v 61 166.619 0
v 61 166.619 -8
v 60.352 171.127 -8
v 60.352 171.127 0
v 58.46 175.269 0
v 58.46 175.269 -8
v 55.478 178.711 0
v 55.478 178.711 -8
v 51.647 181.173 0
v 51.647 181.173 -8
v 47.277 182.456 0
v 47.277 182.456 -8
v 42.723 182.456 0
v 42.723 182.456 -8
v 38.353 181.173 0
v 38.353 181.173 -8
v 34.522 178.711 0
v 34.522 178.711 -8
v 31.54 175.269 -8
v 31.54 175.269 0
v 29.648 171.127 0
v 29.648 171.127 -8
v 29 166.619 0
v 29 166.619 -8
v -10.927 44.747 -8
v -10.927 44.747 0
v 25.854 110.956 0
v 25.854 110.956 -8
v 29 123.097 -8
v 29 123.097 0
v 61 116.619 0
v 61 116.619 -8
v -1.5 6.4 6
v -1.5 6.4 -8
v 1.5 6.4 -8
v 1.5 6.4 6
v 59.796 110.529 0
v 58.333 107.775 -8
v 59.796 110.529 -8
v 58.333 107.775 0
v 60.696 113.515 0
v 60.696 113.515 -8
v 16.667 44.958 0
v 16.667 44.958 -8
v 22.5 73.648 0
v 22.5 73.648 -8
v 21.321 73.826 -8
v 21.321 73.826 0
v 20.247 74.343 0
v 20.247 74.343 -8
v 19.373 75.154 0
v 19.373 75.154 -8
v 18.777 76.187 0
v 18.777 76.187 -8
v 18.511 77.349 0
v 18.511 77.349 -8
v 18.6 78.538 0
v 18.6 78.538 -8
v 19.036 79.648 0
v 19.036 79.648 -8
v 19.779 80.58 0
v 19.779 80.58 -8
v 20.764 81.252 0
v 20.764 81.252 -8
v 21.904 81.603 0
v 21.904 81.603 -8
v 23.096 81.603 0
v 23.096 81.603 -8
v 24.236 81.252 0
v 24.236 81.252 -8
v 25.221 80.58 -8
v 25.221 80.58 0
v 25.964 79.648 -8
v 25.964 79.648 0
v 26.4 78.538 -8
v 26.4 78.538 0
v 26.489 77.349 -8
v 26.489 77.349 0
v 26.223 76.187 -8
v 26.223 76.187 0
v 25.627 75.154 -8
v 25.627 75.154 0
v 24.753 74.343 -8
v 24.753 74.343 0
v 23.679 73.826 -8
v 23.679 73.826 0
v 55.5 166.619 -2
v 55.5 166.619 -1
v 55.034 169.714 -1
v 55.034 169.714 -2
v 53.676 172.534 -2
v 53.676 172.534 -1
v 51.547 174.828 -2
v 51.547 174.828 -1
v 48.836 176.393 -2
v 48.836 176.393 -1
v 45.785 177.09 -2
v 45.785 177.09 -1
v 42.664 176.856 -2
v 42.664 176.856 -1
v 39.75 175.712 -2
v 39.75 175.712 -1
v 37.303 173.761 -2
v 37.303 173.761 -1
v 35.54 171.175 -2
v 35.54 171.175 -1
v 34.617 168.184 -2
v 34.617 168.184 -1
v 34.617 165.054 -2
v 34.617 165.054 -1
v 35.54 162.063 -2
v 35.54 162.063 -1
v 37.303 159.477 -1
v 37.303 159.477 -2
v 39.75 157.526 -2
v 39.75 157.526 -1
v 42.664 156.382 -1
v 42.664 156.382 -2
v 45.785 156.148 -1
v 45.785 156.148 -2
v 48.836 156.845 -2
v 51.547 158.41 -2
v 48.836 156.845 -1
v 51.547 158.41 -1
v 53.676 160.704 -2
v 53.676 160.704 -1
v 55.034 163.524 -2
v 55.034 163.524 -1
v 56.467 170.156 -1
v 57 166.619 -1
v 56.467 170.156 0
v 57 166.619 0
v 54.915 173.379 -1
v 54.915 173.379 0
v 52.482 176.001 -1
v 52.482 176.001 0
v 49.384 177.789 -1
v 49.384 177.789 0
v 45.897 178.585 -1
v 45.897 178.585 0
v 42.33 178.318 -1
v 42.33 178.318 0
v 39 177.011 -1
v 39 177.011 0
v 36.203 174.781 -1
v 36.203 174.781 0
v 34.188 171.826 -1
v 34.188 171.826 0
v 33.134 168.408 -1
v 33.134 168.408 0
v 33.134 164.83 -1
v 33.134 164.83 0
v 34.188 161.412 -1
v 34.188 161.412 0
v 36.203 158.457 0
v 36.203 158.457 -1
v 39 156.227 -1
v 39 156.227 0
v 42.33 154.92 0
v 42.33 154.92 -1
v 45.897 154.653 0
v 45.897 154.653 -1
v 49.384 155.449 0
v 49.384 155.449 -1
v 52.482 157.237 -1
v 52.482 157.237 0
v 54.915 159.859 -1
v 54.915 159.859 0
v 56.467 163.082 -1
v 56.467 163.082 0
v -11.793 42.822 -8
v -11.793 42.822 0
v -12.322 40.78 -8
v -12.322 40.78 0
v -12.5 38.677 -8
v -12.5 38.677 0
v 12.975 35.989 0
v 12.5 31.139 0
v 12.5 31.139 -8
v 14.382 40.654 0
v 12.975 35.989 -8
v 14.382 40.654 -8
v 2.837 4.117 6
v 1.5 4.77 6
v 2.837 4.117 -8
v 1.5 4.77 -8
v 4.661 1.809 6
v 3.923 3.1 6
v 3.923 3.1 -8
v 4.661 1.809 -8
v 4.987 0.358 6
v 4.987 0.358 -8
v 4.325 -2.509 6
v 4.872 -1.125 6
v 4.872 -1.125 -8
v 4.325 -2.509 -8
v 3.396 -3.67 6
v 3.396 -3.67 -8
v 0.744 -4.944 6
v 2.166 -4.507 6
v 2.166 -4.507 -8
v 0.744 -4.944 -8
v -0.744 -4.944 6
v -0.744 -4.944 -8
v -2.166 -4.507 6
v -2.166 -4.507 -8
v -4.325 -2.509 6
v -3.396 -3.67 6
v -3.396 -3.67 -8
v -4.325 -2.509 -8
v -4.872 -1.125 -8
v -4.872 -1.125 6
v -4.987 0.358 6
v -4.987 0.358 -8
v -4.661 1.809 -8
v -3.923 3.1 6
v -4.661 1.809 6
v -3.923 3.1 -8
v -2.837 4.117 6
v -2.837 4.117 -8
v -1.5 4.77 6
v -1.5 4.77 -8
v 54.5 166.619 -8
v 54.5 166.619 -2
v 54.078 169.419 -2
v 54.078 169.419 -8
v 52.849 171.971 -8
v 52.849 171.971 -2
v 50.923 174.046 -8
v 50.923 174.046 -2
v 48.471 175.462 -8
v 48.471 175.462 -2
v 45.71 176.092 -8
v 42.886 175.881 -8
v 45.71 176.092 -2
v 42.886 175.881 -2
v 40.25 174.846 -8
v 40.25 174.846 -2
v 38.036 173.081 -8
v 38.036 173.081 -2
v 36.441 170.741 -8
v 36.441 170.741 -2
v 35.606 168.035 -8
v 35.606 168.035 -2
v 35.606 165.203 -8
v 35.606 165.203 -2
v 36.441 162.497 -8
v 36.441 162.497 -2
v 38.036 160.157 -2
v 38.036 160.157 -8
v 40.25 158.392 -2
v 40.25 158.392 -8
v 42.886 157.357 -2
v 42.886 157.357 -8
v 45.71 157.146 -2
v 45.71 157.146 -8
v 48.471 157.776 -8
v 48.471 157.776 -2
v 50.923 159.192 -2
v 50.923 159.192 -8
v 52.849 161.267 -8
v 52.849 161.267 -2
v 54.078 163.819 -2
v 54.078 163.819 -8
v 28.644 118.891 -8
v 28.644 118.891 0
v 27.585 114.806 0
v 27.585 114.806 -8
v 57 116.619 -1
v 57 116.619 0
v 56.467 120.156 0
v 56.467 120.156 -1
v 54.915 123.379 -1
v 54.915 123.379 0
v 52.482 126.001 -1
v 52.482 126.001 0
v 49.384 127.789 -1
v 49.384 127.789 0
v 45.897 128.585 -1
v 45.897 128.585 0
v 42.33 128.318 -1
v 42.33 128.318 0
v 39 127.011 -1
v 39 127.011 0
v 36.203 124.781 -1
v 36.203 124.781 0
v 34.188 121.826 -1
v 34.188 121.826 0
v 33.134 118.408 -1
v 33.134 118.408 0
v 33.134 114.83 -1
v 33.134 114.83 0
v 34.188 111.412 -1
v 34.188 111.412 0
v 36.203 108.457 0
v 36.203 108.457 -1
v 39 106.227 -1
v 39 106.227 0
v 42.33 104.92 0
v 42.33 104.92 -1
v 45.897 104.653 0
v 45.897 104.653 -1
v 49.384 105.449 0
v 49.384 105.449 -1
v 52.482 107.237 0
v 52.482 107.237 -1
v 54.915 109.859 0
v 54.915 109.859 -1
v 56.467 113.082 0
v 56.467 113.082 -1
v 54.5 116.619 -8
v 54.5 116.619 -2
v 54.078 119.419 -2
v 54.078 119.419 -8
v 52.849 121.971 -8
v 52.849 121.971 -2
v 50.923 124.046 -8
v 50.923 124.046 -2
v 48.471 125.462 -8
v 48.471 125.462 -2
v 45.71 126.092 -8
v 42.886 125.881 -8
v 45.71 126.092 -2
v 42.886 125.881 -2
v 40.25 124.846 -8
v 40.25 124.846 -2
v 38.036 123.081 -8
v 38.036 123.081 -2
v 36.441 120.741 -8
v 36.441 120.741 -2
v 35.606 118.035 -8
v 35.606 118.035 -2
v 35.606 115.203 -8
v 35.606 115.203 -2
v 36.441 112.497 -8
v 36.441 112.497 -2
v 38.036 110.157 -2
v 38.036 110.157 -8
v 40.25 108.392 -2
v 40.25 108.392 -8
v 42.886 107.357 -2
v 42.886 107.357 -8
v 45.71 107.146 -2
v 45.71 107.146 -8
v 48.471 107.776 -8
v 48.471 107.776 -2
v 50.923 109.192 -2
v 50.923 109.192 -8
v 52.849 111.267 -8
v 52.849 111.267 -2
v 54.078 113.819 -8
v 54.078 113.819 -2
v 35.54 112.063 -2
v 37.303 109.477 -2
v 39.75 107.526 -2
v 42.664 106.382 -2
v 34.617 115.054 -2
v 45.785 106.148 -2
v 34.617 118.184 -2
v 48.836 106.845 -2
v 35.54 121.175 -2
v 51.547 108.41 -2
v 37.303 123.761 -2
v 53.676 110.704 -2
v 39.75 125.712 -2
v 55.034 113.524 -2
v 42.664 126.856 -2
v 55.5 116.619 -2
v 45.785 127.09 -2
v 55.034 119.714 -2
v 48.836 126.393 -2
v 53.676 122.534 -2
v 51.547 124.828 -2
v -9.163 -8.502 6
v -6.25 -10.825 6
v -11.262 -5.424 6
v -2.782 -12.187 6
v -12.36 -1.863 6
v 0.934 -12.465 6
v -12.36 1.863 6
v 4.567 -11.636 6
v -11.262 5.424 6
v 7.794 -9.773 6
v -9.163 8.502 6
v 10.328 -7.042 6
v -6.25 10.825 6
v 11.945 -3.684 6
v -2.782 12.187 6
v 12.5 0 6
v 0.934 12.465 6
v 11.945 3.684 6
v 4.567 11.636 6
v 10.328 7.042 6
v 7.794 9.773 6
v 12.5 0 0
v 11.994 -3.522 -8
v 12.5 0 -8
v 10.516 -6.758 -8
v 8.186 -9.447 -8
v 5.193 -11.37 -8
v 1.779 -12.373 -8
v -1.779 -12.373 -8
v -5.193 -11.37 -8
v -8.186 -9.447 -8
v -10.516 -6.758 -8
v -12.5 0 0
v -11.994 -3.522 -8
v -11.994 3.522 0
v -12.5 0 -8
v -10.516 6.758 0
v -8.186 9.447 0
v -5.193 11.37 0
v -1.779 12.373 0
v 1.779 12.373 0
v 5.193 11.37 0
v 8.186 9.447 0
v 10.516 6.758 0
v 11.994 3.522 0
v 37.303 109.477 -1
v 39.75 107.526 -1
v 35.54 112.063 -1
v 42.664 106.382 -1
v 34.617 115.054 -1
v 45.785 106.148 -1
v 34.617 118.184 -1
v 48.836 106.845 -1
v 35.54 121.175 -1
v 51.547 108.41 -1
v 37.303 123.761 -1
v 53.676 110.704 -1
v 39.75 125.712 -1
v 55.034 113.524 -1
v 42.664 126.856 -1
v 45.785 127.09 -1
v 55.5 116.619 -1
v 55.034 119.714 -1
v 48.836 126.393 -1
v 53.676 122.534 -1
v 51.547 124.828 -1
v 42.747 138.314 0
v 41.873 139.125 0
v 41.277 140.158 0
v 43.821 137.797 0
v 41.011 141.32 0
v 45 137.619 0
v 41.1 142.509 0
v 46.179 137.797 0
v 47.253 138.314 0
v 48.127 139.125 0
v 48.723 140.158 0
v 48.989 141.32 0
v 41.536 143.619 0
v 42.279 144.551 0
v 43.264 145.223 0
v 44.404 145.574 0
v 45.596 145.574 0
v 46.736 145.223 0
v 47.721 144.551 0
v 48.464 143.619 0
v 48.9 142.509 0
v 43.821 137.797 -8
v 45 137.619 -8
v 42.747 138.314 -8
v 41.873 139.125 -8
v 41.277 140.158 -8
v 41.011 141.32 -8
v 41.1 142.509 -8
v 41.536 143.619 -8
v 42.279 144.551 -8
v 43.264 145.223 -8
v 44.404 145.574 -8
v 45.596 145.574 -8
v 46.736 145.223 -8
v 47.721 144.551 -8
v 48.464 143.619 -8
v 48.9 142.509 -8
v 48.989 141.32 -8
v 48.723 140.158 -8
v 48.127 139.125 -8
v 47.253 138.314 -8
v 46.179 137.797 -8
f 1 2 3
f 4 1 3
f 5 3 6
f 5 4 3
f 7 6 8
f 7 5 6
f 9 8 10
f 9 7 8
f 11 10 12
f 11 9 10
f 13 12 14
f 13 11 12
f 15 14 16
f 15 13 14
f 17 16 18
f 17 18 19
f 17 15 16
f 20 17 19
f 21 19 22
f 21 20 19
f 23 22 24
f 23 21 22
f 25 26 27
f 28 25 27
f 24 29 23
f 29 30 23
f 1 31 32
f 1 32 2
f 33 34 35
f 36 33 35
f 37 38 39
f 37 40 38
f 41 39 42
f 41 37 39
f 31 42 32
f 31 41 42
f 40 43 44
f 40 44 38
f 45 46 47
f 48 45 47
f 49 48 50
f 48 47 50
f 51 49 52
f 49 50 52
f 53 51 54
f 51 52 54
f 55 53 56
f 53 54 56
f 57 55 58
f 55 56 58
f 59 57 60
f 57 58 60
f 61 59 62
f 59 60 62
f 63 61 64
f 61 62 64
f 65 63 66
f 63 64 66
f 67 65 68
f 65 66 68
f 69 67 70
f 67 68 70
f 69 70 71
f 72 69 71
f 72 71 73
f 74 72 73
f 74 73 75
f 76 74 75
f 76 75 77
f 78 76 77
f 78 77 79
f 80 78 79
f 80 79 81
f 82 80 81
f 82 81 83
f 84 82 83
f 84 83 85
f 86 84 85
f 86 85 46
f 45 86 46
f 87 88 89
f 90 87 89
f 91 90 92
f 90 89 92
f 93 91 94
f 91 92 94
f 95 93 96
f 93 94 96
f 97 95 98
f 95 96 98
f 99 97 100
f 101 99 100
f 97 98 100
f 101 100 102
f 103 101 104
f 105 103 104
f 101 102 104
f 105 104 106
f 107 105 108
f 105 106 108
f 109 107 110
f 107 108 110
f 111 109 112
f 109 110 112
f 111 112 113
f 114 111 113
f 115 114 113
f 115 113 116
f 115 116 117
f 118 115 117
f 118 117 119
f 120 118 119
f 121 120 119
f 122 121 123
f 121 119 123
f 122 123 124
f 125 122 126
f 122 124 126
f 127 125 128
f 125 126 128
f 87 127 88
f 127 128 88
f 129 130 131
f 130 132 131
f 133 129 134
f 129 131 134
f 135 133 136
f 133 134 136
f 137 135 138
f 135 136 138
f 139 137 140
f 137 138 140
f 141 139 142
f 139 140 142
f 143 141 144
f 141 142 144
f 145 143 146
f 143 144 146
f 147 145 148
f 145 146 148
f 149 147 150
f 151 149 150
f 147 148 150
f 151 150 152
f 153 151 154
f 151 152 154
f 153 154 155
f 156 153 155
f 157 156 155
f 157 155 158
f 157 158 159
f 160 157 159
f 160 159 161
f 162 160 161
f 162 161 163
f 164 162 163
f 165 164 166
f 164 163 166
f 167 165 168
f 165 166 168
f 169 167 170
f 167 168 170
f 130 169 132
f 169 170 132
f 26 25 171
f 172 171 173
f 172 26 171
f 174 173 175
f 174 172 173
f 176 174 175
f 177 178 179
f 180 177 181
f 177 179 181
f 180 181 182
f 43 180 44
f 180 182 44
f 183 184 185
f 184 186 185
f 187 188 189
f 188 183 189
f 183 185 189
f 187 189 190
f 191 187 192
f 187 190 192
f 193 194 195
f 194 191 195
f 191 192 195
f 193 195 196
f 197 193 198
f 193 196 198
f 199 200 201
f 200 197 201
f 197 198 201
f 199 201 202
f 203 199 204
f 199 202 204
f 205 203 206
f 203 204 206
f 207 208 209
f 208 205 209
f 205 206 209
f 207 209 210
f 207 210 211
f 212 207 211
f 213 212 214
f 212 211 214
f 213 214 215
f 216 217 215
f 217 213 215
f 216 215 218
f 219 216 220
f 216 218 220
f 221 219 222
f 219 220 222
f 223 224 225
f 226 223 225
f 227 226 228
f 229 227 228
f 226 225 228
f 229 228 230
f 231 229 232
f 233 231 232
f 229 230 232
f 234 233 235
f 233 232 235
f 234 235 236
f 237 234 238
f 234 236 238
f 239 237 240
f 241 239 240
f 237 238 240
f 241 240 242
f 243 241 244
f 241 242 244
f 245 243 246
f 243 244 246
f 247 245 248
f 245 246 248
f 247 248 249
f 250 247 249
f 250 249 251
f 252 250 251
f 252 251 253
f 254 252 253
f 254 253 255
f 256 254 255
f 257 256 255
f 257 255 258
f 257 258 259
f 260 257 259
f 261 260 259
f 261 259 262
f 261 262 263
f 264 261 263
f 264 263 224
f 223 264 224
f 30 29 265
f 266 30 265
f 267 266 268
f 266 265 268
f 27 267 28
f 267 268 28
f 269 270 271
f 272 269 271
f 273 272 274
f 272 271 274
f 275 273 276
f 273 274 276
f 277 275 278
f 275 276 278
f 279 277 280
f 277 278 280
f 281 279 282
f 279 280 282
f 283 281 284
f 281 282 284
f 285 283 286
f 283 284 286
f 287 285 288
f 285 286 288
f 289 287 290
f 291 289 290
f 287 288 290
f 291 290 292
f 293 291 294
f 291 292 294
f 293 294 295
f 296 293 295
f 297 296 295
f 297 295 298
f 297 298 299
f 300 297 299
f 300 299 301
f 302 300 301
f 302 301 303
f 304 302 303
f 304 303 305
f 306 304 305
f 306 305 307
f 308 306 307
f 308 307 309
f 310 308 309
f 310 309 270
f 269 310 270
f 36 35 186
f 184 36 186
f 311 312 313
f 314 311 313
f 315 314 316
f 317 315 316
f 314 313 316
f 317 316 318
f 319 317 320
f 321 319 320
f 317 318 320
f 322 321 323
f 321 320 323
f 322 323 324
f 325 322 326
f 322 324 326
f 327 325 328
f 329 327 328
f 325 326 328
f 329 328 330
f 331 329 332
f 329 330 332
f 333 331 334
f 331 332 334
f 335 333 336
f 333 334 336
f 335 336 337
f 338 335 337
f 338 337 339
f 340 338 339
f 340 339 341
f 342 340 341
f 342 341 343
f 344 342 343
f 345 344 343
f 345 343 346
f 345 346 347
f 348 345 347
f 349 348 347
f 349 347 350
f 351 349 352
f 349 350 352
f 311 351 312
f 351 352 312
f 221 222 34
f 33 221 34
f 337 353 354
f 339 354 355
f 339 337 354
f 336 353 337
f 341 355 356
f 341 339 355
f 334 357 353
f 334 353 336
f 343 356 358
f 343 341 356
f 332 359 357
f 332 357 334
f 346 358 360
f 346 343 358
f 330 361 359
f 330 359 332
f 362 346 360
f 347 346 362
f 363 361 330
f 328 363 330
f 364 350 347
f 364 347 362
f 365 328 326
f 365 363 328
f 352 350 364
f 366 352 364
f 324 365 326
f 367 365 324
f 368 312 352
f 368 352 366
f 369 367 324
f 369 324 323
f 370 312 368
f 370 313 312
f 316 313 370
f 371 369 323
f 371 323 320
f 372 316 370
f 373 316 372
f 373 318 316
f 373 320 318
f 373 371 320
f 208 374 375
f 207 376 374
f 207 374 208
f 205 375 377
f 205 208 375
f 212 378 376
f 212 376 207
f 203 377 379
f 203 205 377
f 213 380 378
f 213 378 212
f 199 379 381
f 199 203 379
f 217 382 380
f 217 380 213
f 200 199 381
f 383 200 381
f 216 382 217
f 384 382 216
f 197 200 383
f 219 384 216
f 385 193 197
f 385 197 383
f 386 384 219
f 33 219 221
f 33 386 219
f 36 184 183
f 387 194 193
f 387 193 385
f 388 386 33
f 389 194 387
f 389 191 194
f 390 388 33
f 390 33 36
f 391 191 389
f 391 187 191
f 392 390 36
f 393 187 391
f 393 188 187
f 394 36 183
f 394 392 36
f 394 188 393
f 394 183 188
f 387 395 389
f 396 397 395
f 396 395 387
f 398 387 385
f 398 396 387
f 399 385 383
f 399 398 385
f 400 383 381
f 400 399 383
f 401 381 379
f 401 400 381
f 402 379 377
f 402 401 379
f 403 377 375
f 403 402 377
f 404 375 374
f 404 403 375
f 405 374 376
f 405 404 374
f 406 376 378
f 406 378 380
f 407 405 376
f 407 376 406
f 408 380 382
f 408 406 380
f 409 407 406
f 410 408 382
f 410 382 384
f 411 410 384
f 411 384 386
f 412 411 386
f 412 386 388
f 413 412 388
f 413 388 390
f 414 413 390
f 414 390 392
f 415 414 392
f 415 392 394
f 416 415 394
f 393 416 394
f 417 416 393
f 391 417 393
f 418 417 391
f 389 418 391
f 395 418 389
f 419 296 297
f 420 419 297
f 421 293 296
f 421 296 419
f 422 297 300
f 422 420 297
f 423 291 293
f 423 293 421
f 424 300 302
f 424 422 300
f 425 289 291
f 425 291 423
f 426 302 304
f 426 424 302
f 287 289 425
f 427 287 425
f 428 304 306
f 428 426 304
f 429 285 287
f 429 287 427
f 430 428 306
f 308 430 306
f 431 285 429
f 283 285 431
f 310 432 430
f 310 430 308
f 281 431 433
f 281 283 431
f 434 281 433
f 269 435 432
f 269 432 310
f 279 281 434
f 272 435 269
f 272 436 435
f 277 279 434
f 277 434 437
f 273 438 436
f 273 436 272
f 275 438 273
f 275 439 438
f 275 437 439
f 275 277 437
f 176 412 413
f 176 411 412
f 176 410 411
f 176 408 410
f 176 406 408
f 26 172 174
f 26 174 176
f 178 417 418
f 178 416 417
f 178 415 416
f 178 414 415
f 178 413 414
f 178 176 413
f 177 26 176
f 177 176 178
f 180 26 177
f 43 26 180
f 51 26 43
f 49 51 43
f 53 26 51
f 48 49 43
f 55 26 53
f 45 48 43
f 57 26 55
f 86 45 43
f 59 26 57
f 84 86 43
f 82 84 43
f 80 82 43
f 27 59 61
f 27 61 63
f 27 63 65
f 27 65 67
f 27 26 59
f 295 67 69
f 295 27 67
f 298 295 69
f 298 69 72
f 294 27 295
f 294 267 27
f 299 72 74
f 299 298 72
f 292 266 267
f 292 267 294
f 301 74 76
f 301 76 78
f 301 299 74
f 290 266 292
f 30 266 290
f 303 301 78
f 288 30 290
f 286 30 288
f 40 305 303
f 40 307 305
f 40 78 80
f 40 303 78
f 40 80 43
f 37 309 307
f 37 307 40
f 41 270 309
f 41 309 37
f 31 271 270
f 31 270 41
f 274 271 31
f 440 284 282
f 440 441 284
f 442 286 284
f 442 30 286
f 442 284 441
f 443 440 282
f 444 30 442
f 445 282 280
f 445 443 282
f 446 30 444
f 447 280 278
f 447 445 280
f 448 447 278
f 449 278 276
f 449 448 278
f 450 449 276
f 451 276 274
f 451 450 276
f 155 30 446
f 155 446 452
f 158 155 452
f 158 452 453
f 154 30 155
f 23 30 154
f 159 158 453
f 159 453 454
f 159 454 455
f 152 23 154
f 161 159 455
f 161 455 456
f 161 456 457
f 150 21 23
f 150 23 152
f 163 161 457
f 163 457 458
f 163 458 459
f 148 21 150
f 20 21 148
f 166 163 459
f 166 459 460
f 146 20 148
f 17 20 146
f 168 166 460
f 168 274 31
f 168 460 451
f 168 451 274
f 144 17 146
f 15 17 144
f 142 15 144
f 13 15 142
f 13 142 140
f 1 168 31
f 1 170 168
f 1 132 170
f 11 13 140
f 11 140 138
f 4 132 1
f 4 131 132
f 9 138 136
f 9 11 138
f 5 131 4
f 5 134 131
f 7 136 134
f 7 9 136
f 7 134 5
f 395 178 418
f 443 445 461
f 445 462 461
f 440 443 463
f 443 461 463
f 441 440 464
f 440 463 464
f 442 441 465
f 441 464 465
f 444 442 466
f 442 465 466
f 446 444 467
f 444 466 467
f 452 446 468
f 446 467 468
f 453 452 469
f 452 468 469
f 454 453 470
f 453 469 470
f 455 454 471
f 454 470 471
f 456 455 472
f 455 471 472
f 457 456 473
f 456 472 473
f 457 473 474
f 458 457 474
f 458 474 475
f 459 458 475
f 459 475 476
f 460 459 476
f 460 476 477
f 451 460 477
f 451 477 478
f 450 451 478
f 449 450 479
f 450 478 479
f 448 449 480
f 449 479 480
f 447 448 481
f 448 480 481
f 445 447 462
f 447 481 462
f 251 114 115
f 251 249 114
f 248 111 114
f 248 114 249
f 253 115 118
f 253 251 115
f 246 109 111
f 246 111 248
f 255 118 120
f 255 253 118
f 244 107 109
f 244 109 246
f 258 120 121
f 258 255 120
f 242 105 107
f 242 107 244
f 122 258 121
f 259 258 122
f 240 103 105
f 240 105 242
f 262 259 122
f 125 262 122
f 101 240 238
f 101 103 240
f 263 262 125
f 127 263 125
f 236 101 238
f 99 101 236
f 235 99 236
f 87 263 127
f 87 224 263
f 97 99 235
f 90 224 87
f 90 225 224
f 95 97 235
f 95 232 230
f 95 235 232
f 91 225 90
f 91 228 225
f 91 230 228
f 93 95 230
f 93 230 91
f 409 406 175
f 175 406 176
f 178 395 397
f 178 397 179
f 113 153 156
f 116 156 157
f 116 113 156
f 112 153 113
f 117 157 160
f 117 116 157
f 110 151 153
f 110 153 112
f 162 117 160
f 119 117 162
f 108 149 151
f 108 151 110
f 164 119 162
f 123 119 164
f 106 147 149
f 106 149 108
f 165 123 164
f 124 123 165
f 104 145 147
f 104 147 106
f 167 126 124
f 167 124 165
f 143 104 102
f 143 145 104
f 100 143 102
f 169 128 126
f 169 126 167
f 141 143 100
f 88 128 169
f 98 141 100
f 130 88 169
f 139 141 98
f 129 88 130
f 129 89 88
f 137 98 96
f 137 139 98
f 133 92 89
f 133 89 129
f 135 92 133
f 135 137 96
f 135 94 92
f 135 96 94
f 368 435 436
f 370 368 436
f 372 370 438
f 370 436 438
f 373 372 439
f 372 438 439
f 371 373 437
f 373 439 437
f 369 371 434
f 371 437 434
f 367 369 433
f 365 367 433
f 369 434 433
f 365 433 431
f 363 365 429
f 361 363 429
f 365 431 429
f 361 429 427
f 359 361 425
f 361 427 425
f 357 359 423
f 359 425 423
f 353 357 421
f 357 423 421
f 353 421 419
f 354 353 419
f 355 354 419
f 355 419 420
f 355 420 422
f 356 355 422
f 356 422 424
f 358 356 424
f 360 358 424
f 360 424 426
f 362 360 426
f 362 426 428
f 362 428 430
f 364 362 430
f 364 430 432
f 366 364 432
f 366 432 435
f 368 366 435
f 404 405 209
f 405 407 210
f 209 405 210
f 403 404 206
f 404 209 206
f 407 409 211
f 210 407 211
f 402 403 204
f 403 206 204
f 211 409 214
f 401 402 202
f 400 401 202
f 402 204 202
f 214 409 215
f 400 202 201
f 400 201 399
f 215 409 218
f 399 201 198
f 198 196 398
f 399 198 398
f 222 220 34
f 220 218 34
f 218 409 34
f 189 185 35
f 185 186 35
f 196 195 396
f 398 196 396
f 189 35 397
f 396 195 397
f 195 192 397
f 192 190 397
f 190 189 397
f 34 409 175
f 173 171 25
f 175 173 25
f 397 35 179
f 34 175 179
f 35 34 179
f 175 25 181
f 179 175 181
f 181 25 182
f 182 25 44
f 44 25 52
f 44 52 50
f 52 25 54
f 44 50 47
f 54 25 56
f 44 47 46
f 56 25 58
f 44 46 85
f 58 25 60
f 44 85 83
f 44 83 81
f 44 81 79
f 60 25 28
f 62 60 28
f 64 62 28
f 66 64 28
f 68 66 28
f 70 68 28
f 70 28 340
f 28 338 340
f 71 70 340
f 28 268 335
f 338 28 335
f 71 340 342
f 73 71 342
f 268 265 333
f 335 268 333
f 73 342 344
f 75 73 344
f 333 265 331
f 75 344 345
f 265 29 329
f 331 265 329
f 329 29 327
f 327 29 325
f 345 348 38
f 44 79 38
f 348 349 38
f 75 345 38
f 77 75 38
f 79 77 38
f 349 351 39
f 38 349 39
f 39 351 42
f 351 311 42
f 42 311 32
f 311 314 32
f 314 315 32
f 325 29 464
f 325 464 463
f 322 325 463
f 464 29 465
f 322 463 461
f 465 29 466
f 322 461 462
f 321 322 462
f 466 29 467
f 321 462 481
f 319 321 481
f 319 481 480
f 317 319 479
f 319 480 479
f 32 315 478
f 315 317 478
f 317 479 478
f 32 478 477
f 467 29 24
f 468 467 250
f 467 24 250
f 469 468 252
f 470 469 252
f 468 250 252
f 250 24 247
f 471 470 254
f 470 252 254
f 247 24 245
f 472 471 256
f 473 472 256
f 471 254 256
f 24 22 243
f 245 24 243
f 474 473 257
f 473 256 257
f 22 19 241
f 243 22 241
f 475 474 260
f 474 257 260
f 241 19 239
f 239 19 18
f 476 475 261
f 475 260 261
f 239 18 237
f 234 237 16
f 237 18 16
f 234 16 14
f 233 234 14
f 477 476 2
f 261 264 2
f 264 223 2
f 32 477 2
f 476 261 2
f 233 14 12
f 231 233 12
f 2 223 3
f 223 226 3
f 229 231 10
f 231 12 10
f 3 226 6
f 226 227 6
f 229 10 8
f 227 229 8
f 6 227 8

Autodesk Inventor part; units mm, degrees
ref_plane "YZ Plane" through (0, 0, 0) normal (1, 0, 0) x (0, 1, 0)
ref_plane "XZ Plane" through (0, 0, 0) normal (0, 1, 0) x (-1, 0, 0)
sketch "Skizze1" plane through (0, 0, 0) normal (0, 0, 1) x (1, 0, 0)
  arc A0 (-1.5, 4.7697) -> (1.5, 4.7697) centre (0, 0) ccw
  circle A1 centre (0, 0) radius 12.5
  line L0 (-30.9429, 0) -> (77.0229, 0) construction
  circle A2 centre (0, 0) radius 12.5
  circle A3 centre (45, 116.619) radius 16
  line L1 (61, 116.619) -> (61, 166.619)
  line L2 (29, 116.619) -> (29, 166.619)
  line L3 (45, 116.619) -> (45, 182.619) construction
  line L4 (45, 116.619) -> (45, 132.619) construction
  line L5 (29, 116.619) -> (61, 116.619) construction
  line L6 (-12.5, 0) -> (-12.5, 38.6768)
  line L7 (12.5, 0) -> (12.5, 38.6768)
  line L8 (-12.5, 38.6768) -> (12.5, 38.6768) construction
  circle A4 centre (0, 38.6768) radius 12.5 construction
  line L9 (-10.9271, 44.7471) -> (29, 116.619)
  arc A5 (-10.9271, 44.7471) -> (-12.5, 38.6768) centre (0, 38.6768) ccw
  line L10 (12.5, 38.6768) -> (58.3334, 107.7748)
  arc A6 (58.3334, 107.7748) -> (61, 116.619) centre (45, 116.619) ccw
  line L11 (0, 38.6768) -> (45, 116.619) construction
  circle A7 centre (45, 166.619) radius 16
  circle A8 centre (45, 166.619) radius 9.5
  circle A9 centre (45, 116.619) radius 9.5
  line L12 (-1.5, 6.4) -> (1.5, 6.4)
  line L13 (1.5, 6.4) -> (1.5, 4.7697)
  line L14 (-1.5, 4.7697) -> (-1.5, 6.4)
  line L15 (0, 0) -> (0, 5) construction
  line L16 (0, 5) -> (1.5, 5) construction
  circle A10 centre (45, 116.619) radius 12.75 construction
  circle A11 centre (45, 166.619) radius 12.75 construction
  circle A12 centre (45, 116.619) radius 10.5
  circle A13 centre (45, 166.619) radius 10.5
  circle A14 centre (45, 116.619) radius 12
  circle A15 centre (45, 166.619) radius 12
  point P0 (22.5, 77.6479)
  point P1 (45, 141.619)
  point P2 (0, 6.4)
  point P3 (45, 129.369)
  point P4 (33.9582, 110.244)
  point P5 (56.0418, 110.244)
  point P6 (45, 179.369)
  point P7 (33.9582, 160.244)
  point P8 (56.0418, 160.244)
  dimension "d69" = 25.5
  dimension "ParallelHebel_Passflansch_HoleDia" = 25.5
  dimension "d0" = 10
  dimension "d1" = 25
  dimension "d4" = 25
  dimension "d36" = 0
  dimension "ParallelHebel_Gabelgelenk_OuterDia" = 32
  dimension "d38" = 60
  dimension "d40" = 90
  dimension "d41" = 50
  dimension "d42" = 45
  dimension "d43" = 19
  dimension "Nadellager_OuterDia" = 19
  dimension "d45" = 25
  dimension "d51" = 3
  dimension "d52" = 1.4
  dimension "d67" = 360
  dimension "d72" = 360
  dimension "d83" = 21
  dimension "d84" = 24
  dimension "d85" = 21
  dimension "d86" = 24
  dimension "d91" = 125
extrude "Extrusion1" add sketch "Skizze1" along normal blind 6 contours A1
extrude "Extrusion2" add sketch "Skizze1" against normal blind 8 contours A1 | A1 L6 A5 L9 A3 L10 L7 | A3 | L2 A7 L1 A3 | A7 | A12 | A13 | A14 | A15
fillet "Rundung1" radius 25 2 edges at (29, 116.619, -4) (12.5, 38.6768, -4)
hole "Bohrung2" at (45, 141.619, 0) at (22.5, 77.6479, 0) direction (0, 0, -1) diameter 8 end through all
ref_plane "Arbeitsebene1" through (45, 116.619, 0) normal (1, 0, 0) x (0, 0, -1)
extrude "Extrusion5" cut sketch "Skizze1" against normal blind 1 contours A12 | A13 | A14 | A15
extrude "Extrusion6" cut sketch "Skizze1" against normal blind 1 from surface at -1 contours A12 | A13
equation "\"d1_1\" = 25"
equation "\"d8_1\" = 0"
equation "\"d10_1\" = 0"
equation "\"d11_1\" = 25"
equation "\"d23_1\" = 8"
equation "\"d36_1\" = 0"
equation "\"d38_1\" = 60deg"
equation "\"d39_1\" = 35"
equation "\"ParallelLink_Lever_Thickness_1\" = 14"
equation "\"ParallelHebel_Gabelgelenk_OuterDia_1\" = 32"
equation "\"Nadellager_OuterDia_1\" = 19"
equation "\"ParallelHebel_Passflansch_HoleDia_1\" = 25.5"
equation "\"d1_1_2_3\" = 25"
equation "\"ParallelMecha_Bearing_Step_Thickness\" = 6"
equation "\"d8_1_2_3\" = 0"
equation "\"d39_1_2\" = 35"
properties part number "ParallelSystem_ProximalPart_Driven_Counterpart_v2.1_Rillenkugellager" material "Aluminium 6061"
